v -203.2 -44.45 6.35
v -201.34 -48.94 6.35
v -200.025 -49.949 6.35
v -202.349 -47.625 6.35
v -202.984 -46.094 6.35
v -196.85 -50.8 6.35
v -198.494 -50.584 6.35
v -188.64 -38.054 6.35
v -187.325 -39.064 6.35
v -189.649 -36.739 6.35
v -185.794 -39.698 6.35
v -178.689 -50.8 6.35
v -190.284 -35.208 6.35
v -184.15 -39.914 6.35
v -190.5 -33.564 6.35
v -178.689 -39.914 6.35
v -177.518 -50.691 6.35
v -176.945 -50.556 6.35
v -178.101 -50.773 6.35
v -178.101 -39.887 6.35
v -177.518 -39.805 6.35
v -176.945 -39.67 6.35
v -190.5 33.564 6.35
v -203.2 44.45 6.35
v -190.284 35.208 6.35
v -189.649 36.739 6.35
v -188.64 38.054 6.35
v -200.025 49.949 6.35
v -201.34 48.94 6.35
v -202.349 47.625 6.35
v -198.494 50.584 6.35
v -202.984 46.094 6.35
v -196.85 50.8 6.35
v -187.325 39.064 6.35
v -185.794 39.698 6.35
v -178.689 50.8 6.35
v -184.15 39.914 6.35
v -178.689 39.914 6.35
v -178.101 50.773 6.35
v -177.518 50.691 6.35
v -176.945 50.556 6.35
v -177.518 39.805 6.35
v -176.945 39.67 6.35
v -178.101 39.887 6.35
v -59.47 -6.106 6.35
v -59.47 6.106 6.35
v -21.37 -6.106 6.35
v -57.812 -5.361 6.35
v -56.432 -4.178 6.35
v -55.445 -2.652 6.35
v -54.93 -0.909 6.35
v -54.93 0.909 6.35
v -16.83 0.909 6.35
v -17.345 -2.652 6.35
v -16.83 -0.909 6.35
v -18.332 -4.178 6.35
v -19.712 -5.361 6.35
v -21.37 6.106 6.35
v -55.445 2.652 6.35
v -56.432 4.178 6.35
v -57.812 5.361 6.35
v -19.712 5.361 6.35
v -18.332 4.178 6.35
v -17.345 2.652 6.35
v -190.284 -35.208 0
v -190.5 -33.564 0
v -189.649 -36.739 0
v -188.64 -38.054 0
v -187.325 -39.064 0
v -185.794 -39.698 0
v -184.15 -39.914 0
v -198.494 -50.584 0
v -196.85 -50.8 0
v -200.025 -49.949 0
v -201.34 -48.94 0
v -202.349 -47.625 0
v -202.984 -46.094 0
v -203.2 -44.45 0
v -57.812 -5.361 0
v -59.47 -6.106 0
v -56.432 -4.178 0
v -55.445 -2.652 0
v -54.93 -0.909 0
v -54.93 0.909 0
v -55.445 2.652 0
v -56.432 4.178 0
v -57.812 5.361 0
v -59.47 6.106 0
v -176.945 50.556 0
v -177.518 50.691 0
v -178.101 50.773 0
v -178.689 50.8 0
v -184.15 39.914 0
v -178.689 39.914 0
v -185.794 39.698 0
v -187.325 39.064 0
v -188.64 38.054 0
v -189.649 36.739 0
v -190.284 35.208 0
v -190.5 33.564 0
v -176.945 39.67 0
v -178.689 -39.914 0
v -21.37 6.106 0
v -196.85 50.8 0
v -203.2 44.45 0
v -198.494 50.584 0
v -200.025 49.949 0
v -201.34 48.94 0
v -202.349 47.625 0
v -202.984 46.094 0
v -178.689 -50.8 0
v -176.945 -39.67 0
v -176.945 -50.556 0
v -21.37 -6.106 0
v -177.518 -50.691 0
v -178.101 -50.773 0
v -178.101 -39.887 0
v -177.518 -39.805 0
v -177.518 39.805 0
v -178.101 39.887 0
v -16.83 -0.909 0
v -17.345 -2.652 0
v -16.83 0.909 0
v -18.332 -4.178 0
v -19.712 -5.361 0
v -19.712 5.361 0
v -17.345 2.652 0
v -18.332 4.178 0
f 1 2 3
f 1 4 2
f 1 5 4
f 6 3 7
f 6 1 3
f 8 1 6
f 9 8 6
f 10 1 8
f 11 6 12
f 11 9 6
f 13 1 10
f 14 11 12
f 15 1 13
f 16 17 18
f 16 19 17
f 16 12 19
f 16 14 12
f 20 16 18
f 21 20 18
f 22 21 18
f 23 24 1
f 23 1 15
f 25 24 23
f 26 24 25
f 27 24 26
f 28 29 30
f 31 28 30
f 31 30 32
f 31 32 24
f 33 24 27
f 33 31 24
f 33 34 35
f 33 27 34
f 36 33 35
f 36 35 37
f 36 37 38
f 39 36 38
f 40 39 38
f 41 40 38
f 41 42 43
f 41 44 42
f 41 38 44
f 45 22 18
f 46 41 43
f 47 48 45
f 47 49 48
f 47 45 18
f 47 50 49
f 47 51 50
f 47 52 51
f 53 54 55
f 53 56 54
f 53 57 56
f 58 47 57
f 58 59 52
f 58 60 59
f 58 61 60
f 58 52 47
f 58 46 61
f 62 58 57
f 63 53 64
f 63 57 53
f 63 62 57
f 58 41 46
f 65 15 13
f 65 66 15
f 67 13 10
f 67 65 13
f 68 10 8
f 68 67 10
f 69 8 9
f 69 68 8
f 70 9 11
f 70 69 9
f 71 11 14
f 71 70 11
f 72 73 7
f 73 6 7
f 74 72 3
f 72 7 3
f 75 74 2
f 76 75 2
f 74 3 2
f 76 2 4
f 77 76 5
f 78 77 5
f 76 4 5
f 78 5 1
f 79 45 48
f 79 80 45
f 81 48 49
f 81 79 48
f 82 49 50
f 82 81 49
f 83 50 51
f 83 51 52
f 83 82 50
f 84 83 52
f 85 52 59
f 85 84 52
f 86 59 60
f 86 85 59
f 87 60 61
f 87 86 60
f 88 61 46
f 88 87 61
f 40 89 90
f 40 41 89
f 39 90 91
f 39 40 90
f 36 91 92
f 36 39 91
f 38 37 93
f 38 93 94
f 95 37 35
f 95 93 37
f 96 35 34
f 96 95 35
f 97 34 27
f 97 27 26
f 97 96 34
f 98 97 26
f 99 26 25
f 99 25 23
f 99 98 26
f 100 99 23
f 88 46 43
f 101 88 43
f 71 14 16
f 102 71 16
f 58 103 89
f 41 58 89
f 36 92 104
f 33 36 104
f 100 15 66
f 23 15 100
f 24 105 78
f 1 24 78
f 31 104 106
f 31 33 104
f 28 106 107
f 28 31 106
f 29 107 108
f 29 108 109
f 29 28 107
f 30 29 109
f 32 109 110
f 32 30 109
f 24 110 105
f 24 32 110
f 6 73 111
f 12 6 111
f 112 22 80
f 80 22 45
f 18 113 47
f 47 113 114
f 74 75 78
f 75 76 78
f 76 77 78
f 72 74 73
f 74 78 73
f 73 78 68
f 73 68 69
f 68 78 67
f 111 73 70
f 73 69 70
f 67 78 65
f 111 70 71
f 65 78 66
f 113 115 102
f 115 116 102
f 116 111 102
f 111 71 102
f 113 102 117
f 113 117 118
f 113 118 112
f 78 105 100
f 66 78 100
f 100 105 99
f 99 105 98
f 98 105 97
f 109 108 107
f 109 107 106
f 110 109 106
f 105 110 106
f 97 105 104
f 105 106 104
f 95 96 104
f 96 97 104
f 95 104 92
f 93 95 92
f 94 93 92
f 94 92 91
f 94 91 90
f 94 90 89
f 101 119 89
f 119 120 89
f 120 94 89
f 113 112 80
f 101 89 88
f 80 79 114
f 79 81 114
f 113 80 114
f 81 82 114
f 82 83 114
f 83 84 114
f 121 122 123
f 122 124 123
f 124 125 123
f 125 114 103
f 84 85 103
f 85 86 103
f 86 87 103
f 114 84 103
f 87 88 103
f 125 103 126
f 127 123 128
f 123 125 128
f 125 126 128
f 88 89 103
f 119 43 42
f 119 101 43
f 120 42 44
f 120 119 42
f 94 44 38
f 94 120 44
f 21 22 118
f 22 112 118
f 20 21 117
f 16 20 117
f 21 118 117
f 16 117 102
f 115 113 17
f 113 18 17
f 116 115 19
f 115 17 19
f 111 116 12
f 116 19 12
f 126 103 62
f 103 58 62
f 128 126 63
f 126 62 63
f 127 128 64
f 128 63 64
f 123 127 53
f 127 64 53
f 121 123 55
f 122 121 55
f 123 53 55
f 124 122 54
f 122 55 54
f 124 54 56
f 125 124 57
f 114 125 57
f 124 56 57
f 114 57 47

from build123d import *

# Parameters (mm, degrees)
F1_DEPTH = 6.35
F2_W     = 12.7
F2_H     = 79.8285714286
F3_DEPTH = 6.35
F4_R     = 6.35
F5_R     = 6.35


with BuildPart() as f1:
    # F0 (on Top) → F1 (new body)
    with BuildSketch(Plane.XY):
        Polygon((-177.8, 0), (0, 0), (-177.8, 50.8), align=None)
        Polygon((-177.8, -50.8), (0, 0), (-177.8, 0), align=None)
        Polygon((-177.8, 0), (-177.8, 50.8), (-203.2, 50.8), (-203.2, -50.8), (-177.8, -50.8), align=None)
    extrude(amount=F1_DEPTH)

    # F2 (on face) → F3 (cut, through all)
    with BuildSketch(Plane.XY.offset(6.35)):
        Polygon((-177.8, 39.9142857143), (-177.8, -39.9142857143), (-38.1, 0), align=None)
        with Locations((-184.15, 0)):
            Rectangle(F2_W, F2_H)
    extrude(amount=-F3_DEPTH, mode=Mode.SUBTRACT)

    # F4
    f4_edges = [f1.edges().sort_by_distance(p)[0] for p in [
        (-177.8, -50.8, 3.175),
        (-177.8, 50.8, 3.175),
        (-203.2, -50.8, 3.175),
        (-203.2, 50.8, 3.175),
    ]]
    fillet(f4_edges, radius=F4_R)

    # F5
    f5_edges = [f1.edges().sort_by_distance(p)[0] for p in [
        (-177.8, -39.914286, 3.175),
        (-190.5, -39.914286, 3.175),
        (-190.5, 39.914286, 3.175),
        (-177.8, 39.914286, 3.175),
        (0, 0, 3.175),
        (-38.1, 0, 3.175),
    ]]
    fillet(f5_edges, radius=F5_R)


solid = f1.part
